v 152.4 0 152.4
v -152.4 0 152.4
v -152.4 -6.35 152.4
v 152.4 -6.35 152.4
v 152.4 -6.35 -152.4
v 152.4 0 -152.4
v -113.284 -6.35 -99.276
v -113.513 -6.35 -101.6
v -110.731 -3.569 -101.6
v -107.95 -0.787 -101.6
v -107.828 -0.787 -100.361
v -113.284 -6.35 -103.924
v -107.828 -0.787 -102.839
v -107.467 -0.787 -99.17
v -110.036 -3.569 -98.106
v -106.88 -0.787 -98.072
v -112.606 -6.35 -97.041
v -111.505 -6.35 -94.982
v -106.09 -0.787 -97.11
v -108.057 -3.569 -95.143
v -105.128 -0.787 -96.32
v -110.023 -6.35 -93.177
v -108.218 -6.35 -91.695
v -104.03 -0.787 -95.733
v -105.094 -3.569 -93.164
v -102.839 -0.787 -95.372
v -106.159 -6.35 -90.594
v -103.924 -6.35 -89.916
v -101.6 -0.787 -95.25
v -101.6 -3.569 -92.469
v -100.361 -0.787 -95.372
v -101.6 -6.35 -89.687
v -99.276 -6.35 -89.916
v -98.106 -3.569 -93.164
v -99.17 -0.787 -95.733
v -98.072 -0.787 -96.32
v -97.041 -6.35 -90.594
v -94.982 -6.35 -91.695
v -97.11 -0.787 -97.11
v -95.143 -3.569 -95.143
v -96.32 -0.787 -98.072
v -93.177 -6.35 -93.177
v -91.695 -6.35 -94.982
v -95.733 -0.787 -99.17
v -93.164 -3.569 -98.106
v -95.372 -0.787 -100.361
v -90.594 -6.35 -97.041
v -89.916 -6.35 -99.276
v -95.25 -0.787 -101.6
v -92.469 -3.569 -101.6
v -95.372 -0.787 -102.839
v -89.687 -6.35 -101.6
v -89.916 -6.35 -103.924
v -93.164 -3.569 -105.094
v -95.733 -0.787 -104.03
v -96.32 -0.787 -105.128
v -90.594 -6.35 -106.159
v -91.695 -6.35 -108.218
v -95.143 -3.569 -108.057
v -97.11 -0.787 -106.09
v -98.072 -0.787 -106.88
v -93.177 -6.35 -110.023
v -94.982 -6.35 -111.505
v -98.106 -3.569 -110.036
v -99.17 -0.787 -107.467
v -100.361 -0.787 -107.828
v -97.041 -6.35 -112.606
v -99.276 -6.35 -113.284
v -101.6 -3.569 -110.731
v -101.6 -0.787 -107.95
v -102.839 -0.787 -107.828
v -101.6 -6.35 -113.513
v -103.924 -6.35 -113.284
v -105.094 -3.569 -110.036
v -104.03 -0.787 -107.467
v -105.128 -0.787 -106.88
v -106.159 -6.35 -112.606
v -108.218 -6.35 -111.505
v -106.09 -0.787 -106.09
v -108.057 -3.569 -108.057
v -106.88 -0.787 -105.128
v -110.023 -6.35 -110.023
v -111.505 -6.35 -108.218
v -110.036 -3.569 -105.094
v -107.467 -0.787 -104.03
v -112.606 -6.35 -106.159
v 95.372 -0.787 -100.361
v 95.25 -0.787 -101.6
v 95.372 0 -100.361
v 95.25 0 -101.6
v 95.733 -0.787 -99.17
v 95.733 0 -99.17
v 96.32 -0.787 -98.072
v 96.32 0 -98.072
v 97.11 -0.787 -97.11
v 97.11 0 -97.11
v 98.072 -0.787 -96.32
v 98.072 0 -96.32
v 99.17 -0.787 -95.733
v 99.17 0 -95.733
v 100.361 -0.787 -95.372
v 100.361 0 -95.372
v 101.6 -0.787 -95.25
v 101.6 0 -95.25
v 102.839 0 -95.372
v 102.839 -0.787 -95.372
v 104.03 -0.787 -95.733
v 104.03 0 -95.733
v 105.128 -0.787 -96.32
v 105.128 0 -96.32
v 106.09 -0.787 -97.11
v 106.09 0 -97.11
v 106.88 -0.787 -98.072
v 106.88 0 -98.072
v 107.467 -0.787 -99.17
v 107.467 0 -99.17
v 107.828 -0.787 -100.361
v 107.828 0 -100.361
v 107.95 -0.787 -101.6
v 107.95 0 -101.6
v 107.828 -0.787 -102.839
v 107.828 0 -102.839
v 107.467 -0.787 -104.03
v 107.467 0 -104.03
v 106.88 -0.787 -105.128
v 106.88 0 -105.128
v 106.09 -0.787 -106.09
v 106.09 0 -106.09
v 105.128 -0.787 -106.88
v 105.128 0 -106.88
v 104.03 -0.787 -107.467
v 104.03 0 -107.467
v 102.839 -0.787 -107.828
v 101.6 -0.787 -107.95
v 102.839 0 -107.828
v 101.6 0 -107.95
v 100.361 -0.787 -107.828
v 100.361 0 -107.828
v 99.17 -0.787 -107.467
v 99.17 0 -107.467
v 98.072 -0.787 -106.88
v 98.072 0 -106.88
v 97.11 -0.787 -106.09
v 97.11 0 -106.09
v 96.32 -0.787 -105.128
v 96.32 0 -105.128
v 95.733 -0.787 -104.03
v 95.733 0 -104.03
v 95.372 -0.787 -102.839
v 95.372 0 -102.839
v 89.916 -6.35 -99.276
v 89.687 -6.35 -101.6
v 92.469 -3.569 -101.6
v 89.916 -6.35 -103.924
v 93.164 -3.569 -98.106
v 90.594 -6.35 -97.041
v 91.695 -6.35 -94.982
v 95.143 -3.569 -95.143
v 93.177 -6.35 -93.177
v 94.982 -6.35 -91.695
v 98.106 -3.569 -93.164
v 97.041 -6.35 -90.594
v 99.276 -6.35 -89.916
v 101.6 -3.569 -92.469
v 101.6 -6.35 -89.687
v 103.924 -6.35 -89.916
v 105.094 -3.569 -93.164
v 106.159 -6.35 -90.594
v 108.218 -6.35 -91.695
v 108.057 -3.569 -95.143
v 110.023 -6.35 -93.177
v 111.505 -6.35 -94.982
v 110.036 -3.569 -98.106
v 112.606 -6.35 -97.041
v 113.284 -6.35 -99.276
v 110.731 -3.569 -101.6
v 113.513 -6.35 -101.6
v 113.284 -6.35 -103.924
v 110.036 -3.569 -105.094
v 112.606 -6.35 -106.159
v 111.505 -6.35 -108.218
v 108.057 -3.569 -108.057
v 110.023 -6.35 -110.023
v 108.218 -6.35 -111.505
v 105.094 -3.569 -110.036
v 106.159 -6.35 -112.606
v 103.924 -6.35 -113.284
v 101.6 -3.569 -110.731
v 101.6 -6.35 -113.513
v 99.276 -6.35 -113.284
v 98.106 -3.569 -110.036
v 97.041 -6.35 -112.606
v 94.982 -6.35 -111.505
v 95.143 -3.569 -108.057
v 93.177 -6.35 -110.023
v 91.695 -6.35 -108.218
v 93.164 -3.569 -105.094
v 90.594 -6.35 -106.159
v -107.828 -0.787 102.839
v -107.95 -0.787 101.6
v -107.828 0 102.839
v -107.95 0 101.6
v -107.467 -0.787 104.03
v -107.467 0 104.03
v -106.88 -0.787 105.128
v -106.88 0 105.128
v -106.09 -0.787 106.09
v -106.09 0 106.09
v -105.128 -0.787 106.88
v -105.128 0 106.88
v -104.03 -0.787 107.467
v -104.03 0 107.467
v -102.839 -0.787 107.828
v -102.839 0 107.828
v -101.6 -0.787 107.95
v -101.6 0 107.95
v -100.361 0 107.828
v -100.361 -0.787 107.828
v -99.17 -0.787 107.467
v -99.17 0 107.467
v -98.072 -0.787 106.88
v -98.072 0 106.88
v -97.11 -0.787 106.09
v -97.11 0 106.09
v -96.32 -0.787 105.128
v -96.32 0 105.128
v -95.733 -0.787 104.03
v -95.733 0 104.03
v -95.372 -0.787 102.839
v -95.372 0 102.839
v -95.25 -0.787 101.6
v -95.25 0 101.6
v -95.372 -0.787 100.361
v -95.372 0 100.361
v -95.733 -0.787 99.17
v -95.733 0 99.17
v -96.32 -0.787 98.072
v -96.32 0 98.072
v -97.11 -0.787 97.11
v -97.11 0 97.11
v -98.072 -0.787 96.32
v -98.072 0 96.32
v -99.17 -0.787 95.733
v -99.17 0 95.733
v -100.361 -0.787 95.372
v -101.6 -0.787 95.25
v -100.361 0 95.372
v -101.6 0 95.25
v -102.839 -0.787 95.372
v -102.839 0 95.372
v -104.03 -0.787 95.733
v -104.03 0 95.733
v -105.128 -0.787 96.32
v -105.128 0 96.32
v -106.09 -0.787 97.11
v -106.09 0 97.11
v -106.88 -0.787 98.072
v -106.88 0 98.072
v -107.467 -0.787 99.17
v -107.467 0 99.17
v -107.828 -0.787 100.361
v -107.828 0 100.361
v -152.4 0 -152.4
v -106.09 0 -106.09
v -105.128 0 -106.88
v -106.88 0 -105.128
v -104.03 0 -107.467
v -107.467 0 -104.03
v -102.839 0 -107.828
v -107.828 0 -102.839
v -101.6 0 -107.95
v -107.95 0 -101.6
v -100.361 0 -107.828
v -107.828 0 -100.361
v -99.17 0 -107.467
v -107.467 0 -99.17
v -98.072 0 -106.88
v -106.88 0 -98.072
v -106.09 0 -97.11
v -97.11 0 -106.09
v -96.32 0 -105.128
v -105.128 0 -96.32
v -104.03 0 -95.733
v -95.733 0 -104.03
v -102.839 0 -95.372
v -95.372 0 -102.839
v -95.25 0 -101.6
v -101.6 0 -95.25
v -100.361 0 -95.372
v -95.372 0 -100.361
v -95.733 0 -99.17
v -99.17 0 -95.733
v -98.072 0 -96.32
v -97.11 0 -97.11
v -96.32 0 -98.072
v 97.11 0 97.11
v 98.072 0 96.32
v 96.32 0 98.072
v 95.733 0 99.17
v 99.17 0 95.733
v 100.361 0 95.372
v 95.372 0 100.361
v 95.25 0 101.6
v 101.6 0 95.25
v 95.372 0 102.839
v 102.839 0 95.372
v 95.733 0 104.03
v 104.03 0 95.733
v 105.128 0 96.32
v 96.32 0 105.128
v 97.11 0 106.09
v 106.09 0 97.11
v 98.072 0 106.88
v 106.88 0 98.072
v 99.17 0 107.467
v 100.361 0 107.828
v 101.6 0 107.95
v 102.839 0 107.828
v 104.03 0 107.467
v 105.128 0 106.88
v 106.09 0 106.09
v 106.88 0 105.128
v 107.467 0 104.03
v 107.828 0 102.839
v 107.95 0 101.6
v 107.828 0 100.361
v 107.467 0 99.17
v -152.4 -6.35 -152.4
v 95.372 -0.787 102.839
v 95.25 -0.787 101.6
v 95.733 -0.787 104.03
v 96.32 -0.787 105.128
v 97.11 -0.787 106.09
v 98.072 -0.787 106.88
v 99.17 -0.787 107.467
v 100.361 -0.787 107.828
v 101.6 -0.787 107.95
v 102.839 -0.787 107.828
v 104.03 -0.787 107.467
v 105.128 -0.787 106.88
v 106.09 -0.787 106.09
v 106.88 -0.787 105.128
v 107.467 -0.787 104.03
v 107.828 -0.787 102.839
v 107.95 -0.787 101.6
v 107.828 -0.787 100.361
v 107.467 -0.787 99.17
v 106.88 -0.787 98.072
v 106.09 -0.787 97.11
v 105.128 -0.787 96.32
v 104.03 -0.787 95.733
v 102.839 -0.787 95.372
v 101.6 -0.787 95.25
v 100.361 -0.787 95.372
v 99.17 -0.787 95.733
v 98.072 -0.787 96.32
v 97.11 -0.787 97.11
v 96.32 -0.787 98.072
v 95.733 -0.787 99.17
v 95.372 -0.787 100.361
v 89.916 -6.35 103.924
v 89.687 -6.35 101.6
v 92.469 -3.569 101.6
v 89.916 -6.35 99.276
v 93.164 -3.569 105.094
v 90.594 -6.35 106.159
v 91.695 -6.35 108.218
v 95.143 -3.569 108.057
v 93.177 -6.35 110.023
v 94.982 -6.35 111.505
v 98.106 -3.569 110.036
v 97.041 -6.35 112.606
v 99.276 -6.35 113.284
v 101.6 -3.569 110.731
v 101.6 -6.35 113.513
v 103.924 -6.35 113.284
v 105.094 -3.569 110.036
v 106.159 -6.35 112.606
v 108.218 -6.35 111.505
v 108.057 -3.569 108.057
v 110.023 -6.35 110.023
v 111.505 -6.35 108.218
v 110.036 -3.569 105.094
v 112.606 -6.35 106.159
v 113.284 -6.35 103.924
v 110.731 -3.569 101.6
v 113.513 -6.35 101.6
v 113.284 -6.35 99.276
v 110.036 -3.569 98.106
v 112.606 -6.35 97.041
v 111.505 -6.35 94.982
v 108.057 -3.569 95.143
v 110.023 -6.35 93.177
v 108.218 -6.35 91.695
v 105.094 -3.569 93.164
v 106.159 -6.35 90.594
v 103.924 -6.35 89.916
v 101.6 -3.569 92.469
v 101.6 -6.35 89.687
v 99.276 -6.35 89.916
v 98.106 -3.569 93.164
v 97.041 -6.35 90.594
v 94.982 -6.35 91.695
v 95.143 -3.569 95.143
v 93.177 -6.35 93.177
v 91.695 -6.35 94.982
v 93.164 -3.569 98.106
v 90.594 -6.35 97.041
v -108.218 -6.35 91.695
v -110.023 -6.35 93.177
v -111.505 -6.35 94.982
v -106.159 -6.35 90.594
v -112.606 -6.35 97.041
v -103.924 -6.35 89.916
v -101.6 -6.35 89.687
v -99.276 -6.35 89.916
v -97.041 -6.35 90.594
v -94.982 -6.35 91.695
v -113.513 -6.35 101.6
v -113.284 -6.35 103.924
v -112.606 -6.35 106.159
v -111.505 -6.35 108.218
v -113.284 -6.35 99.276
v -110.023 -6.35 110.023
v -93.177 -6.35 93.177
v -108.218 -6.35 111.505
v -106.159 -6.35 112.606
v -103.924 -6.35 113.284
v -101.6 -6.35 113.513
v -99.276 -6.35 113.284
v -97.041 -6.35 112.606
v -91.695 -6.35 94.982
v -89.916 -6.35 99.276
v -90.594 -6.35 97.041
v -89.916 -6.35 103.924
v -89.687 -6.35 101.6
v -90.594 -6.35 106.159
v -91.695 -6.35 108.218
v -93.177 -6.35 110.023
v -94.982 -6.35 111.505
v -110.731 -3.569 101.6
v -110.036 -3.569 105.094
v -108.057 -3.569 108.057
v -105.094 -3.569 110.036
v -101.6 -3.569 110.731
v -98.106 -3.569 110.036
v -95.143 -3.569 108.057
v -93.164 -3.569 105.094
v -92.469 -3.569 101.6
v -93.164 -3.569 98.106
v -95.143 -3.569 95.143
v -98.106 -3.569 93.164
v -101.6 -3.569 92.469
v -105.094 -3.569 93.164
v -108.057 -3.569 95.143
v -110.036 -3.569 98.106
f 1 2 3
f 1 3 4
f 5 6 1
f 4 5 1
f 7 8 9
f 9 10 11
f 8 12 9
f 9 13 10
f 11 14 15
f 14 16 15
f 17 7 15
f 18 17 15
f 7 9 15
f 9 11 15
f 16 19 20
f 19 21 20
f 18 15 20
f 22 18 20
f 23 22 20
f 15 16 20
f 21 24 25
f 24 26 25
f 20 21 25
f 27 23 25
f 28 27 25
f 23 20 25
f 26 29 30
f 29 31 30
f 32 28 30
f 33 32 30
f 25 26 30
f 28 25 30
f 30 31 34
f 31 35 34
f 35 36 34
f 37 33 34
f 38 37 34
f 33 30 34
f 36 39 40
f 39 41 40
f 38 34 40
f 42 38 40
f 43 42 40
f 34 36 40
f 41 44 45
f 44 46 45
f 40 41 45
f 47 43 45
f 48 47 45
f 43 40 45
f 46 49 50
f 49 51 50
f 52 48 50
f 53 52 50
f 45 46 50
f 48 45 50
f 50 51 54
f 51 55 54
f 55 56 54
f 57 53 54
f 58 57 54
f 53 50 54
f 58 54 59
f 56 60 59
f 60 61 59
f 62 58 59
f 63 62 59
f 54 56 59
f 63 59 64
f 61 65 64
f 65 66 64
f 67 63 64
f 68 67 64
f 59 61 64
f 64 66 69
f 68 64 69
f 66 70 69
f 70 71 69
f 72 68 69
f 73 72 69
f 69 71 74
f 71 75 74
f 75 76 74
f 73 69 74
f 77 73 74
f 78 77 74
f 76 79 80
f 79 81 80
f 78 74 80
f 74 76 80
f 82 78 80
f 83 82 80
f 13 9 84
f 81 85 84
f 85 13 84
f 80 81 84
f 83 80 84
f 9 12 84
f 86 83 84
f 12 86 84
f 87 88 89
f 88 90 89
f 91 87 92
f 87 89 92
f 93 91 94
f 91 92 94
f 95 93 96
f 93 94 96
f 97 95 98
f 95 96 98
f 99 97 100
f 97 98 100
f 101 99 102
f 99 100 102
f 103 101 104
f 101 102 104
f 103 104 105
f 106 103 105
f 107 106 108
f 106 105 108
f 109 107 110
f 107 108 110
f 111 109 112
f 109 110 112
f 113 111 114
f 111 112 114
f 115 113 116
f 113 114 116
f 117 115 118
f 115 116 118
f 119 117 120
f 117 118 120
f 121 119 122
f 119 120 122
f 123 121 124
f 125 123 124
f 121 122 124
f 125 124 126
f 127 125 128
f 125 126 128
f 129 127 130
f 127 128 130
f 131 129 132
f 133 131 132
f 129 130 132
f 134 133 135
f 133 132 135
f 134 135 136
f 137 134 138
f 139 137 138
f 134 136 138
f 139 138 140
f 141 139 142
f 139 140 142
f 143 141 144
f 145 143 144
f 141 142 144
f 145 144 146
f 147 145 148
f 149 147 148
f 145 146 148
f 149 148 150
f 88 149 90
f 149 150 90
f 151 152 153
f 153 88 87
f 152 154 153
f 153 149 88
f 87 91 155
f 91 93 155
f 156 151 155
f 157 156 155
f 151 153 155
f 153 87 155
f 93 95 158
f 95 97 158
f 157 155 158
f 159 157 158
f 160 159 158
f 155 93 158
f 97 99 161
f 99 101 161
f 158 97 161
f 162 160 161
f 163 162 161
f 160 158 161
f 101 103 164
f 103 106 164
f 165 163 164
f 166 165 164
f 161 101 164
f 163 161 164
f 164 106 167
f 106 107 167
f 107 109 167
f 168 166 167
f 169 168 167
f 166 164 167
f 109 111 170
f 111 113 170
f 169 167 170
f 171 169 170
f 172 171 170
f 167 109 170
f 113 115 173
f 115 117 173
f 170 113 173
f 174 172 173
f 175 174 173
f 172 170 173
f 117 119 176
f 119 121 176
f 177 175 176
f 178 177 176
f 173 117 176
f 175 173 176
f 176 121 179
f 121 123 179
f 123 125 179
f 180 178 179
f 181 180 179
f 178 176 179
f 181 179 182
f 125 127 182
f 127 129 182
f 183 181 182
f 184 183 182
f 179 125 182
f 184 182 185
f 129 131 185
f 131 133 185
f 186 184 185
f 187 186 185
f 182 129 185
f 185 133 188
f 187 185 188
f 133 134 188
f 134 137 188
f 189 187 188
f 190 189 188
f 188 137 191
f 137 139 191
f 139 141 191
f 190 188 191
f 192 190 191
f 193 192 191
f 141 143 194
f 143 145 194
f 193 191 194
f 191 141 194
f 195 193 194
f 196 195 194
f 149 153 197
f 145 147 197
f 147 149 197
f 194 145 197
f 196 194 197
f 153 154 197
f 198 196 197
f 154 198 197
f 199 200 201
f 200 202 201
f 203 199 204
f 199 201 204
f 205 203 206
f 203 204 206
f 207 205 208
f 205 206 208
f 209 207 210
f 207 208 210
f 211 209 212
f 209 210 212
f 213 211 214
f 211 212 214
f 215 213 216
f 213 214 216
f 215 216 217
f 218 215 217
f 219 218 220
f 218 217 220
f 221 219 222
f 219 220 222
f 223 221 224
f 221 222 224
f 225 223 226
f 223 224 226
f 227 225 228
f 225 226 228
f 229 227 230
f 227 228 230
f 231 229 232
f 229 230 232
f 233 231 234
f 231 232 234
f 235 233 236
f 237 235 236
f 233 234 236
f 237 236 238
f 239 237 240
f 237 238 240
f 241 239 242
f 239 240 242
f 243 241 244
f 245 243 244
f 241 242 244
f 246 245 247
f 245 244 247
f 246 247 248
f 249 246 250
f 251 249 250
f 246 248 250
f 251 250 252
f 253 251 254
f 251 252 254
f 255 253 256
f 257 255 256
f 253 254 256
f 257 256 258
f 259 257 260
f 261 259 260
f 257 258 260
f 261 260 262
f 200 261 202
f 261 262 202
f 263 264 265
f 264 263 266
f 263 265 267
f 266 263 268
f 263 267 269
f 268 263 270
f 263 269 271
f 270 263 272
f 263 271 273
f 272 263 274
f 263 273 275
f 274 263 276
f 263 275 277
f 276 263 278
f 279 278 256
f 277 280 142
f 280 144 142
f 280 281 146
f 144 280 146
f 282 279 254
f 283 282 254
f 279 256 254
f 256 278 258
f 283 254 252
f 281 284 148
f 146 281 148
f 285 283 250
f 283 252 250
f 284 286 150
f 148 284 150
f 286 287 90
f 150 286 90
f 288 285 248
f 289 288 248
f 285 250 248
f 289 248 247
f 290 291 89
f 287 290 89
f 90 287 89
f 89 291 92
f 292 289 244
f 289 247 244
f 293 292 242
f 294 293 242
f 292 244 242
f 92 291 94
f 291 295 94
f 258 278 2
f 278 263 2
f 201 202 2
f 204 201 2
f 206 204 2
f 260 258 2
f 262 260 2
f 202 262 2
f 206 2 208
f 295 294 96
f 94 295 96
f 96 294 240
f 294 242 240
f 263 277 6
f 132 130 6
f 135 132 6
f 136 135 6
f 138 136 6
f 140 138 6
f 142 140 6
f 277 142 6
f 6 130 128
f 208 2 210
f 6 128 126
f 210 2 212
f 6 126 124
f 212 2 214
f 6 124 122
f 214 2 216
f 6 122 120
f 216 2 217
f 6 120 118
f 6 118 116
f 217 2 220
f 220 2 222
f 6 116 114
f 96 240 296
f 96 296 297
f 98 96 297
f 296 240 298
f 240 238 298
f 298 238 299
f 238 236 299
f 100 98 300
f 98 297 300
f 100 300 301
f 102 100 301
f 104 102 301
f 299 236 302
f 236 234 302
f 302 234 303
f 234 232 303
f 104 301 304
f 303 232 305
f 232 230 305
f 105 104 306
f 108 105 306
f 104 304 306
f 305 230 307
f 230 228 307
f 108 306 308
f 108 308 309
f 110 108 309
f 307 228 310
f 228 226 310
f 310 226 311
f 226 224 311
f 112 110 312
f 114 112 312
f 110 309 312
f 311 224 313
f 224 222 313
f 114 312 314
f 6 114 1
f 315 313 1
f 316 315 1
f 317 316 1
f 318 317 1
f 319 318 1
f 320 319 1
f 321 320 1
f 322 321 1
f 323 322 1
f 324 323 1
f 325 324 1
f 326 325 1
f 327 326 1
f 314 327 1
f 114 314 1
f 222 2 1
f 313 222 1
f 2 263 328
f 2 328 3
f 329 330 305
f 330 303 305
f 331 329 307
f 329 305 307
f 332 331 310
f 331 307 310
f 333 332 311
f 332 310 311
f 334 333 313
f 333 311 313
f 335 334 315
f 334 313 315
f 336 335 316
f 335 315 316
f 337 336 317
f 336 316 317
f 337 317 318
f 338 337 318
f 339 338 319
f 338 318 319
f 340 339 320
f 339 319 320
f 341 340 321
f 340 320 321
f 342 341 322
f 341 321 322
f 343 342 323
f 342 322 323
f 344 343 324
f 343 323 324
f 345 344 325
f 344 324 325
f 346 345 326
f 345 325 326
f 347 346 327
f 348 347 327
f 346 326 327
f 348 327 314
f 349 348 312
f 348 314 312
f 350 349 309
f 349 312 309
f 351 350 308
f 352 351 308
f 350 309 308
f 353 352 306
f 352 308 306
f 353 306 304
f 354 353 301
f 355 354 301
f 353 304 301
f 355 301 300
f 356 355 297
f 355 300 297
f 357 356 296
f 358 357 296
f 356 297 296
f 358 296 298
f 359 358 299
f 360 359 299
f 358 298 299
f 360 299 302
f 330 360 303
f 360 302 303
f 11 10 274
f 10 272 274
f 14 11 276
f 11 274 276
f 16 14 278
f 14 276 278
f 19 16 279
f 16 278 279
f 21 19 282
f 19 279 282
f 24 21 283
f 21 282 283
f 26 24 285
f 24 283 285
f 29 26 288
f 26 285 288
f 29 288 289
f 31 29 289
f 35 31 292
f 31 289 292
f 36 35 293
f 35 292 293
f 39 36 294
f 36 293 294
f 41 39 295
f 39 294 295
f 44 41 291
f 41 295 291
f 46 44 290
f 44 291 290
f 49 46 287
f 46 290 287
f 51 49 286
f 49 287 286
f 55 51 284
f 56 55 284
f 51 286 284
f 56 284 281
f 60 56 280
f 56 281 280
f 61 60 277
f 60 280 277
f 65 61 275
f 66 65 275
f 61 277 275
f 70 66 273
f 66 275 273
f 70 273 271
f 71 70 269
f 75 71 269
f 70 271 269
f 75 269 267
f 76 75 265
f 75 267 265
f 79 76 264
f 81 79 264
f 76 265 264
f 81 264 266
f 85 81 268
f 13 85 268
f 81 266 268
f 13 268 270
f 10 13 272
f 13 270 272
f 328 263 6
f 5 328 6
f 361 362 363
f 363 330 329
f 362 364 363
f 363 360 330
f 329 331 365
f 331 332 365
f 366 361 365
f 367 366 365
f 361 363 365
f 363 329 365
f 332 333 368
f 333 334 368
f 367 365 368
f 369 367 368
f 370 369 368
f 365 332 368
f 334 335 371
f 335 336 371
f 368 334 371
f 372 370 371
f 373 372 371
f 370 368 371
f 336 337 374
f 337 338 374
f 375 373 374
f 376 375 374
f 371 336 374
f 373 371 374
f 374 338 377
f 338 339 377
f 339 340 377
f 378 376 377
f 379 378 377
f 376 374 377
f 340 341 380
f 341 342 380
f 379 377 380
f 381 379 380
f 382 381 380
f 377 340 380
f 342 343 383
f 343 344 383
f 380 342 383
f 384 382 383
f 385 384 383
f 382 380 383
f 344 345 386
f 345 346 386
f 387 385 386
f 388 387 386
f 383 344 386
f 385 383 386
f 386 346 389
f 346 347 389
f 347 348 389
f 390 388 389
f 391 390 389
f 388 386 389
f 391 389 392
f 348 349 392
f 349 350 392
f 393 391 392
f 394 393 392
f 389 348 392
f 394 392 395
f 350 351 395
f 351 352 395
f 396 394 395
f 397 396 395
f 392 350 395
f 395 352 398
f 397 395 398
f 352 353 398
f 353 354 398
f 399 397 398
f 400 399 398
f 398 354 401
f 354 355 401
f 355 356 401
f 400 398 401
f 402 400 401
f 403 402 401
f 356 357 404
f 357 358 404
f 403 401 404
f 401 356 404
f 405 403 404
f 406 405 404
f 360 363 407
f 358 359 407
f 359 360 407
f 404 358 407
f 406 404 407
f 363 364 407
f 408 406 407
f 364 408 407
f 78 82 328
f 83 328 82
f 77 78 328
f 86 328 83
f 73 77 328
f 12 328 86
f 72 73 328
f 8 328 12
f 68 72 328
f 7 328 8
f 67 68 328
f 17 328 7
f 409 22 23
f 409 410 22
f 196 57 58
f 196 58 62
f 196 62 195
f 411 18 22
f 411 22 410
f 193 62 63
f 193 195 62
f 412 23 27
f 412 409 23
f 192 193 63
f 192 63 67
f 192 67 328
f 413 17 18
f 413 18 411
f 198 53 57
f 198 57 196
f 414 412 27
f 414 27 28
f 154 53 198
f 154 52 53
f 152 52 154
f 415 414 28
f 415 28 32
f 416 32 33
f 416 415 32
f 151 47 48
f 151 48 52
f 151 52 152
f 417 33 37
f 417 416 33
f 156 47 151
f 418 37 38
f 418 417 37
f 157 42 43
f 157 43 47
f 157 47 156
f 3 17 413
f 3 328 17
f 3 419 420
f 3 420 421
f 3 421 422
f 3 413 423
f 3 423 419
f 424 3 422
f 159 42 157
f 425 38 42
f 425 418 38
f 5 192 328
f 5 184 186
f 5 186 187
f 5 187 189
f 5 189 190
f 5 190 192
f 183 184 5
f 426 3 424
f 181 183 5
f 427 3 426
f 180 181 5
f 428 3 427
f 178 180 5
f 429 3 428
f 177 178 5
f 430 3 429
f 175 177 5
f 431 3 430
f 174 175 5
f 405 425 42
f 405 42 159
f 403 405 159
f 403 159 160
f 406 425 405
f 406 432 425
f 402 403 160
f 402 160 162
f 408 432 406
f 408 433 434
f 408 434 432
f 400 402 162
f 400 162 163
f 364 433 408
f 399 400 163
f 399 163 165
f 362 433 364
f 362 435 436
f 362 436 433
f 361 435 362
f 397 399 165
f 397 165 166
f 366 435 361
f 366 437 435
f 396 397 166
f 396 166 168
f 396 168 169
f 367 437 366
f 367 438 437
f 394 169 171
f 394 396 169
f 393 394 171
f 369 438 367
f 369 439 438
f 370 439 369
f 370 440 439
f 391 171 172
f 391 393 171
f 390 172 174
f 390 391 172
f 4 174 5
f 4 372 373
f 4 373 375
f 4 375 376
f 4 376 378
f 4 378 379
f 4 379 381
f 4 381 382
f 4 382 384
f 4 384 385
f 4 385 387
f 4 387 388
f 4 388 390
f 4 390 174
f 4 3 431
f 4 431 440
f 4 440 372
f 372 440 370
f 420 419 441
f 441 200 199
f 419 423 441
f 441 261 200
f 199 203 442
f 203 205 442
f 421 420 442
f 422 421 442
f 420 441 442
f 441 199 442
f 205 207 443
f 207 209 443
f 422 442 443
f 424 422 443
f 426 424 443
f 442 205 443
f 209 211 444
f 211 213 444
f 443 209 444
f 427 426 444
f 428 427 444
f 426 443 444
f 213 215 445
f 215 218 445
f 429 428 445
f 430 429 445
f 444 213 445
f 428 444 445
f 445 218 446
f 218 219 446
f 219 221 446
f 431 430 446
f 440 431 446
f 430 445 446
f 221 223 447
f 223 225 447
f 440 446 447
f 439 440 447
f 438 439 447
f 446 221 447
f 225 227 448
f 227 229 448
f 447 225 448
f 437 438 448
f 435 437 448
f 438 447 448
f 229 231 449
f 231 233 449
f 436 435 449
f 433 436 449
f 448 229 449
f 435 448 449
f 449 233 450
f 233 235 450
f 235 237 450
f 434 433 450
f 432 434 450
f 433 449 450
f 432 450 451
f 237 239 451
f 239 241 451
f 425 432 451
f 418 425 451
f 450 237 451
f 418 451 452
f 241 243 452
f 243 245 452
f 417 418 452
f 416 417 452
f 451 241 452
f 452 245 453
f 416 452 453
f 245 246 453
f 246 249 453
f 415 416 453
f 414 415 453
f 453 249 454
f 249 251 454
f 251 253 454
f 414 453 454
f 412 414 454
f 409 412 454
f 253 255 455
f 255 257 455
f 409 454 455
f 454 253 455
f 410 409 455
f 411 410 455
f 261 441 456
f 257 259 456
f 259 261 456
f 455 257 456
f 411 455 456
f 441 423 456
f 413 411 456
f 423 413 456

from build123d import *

# Parameters (mm, degrees)
F0_W           = 304.8
F0_H           = 304.8
F1_DEPTH       = 6.35
F3_D           = 12.7
F3_CSINK_D     = 23.8252
F3_CSINK_ANGLE = 90


with BuildPart() as f1:
    # F0 (on Front) → F1 (new body)
    with BuildSketch(Plane.XZ):
        Rectangle(F0_W, F0_H)
    extrude(amount=F1_DEPTH)

    # F3 (through all)
    with Locations(Plane.XZ.offset(6.35)):
        with Locations((-101.6, 101.6), (101.6, 101.6), (101.6, -101.6), (-101.6, -101.6)):
            CounterSinkHole(F3_D / 2, F3_CSINK_D / 2, counter_sink_angle=F3_CSINK_ANGLE)


solid = f1.part
